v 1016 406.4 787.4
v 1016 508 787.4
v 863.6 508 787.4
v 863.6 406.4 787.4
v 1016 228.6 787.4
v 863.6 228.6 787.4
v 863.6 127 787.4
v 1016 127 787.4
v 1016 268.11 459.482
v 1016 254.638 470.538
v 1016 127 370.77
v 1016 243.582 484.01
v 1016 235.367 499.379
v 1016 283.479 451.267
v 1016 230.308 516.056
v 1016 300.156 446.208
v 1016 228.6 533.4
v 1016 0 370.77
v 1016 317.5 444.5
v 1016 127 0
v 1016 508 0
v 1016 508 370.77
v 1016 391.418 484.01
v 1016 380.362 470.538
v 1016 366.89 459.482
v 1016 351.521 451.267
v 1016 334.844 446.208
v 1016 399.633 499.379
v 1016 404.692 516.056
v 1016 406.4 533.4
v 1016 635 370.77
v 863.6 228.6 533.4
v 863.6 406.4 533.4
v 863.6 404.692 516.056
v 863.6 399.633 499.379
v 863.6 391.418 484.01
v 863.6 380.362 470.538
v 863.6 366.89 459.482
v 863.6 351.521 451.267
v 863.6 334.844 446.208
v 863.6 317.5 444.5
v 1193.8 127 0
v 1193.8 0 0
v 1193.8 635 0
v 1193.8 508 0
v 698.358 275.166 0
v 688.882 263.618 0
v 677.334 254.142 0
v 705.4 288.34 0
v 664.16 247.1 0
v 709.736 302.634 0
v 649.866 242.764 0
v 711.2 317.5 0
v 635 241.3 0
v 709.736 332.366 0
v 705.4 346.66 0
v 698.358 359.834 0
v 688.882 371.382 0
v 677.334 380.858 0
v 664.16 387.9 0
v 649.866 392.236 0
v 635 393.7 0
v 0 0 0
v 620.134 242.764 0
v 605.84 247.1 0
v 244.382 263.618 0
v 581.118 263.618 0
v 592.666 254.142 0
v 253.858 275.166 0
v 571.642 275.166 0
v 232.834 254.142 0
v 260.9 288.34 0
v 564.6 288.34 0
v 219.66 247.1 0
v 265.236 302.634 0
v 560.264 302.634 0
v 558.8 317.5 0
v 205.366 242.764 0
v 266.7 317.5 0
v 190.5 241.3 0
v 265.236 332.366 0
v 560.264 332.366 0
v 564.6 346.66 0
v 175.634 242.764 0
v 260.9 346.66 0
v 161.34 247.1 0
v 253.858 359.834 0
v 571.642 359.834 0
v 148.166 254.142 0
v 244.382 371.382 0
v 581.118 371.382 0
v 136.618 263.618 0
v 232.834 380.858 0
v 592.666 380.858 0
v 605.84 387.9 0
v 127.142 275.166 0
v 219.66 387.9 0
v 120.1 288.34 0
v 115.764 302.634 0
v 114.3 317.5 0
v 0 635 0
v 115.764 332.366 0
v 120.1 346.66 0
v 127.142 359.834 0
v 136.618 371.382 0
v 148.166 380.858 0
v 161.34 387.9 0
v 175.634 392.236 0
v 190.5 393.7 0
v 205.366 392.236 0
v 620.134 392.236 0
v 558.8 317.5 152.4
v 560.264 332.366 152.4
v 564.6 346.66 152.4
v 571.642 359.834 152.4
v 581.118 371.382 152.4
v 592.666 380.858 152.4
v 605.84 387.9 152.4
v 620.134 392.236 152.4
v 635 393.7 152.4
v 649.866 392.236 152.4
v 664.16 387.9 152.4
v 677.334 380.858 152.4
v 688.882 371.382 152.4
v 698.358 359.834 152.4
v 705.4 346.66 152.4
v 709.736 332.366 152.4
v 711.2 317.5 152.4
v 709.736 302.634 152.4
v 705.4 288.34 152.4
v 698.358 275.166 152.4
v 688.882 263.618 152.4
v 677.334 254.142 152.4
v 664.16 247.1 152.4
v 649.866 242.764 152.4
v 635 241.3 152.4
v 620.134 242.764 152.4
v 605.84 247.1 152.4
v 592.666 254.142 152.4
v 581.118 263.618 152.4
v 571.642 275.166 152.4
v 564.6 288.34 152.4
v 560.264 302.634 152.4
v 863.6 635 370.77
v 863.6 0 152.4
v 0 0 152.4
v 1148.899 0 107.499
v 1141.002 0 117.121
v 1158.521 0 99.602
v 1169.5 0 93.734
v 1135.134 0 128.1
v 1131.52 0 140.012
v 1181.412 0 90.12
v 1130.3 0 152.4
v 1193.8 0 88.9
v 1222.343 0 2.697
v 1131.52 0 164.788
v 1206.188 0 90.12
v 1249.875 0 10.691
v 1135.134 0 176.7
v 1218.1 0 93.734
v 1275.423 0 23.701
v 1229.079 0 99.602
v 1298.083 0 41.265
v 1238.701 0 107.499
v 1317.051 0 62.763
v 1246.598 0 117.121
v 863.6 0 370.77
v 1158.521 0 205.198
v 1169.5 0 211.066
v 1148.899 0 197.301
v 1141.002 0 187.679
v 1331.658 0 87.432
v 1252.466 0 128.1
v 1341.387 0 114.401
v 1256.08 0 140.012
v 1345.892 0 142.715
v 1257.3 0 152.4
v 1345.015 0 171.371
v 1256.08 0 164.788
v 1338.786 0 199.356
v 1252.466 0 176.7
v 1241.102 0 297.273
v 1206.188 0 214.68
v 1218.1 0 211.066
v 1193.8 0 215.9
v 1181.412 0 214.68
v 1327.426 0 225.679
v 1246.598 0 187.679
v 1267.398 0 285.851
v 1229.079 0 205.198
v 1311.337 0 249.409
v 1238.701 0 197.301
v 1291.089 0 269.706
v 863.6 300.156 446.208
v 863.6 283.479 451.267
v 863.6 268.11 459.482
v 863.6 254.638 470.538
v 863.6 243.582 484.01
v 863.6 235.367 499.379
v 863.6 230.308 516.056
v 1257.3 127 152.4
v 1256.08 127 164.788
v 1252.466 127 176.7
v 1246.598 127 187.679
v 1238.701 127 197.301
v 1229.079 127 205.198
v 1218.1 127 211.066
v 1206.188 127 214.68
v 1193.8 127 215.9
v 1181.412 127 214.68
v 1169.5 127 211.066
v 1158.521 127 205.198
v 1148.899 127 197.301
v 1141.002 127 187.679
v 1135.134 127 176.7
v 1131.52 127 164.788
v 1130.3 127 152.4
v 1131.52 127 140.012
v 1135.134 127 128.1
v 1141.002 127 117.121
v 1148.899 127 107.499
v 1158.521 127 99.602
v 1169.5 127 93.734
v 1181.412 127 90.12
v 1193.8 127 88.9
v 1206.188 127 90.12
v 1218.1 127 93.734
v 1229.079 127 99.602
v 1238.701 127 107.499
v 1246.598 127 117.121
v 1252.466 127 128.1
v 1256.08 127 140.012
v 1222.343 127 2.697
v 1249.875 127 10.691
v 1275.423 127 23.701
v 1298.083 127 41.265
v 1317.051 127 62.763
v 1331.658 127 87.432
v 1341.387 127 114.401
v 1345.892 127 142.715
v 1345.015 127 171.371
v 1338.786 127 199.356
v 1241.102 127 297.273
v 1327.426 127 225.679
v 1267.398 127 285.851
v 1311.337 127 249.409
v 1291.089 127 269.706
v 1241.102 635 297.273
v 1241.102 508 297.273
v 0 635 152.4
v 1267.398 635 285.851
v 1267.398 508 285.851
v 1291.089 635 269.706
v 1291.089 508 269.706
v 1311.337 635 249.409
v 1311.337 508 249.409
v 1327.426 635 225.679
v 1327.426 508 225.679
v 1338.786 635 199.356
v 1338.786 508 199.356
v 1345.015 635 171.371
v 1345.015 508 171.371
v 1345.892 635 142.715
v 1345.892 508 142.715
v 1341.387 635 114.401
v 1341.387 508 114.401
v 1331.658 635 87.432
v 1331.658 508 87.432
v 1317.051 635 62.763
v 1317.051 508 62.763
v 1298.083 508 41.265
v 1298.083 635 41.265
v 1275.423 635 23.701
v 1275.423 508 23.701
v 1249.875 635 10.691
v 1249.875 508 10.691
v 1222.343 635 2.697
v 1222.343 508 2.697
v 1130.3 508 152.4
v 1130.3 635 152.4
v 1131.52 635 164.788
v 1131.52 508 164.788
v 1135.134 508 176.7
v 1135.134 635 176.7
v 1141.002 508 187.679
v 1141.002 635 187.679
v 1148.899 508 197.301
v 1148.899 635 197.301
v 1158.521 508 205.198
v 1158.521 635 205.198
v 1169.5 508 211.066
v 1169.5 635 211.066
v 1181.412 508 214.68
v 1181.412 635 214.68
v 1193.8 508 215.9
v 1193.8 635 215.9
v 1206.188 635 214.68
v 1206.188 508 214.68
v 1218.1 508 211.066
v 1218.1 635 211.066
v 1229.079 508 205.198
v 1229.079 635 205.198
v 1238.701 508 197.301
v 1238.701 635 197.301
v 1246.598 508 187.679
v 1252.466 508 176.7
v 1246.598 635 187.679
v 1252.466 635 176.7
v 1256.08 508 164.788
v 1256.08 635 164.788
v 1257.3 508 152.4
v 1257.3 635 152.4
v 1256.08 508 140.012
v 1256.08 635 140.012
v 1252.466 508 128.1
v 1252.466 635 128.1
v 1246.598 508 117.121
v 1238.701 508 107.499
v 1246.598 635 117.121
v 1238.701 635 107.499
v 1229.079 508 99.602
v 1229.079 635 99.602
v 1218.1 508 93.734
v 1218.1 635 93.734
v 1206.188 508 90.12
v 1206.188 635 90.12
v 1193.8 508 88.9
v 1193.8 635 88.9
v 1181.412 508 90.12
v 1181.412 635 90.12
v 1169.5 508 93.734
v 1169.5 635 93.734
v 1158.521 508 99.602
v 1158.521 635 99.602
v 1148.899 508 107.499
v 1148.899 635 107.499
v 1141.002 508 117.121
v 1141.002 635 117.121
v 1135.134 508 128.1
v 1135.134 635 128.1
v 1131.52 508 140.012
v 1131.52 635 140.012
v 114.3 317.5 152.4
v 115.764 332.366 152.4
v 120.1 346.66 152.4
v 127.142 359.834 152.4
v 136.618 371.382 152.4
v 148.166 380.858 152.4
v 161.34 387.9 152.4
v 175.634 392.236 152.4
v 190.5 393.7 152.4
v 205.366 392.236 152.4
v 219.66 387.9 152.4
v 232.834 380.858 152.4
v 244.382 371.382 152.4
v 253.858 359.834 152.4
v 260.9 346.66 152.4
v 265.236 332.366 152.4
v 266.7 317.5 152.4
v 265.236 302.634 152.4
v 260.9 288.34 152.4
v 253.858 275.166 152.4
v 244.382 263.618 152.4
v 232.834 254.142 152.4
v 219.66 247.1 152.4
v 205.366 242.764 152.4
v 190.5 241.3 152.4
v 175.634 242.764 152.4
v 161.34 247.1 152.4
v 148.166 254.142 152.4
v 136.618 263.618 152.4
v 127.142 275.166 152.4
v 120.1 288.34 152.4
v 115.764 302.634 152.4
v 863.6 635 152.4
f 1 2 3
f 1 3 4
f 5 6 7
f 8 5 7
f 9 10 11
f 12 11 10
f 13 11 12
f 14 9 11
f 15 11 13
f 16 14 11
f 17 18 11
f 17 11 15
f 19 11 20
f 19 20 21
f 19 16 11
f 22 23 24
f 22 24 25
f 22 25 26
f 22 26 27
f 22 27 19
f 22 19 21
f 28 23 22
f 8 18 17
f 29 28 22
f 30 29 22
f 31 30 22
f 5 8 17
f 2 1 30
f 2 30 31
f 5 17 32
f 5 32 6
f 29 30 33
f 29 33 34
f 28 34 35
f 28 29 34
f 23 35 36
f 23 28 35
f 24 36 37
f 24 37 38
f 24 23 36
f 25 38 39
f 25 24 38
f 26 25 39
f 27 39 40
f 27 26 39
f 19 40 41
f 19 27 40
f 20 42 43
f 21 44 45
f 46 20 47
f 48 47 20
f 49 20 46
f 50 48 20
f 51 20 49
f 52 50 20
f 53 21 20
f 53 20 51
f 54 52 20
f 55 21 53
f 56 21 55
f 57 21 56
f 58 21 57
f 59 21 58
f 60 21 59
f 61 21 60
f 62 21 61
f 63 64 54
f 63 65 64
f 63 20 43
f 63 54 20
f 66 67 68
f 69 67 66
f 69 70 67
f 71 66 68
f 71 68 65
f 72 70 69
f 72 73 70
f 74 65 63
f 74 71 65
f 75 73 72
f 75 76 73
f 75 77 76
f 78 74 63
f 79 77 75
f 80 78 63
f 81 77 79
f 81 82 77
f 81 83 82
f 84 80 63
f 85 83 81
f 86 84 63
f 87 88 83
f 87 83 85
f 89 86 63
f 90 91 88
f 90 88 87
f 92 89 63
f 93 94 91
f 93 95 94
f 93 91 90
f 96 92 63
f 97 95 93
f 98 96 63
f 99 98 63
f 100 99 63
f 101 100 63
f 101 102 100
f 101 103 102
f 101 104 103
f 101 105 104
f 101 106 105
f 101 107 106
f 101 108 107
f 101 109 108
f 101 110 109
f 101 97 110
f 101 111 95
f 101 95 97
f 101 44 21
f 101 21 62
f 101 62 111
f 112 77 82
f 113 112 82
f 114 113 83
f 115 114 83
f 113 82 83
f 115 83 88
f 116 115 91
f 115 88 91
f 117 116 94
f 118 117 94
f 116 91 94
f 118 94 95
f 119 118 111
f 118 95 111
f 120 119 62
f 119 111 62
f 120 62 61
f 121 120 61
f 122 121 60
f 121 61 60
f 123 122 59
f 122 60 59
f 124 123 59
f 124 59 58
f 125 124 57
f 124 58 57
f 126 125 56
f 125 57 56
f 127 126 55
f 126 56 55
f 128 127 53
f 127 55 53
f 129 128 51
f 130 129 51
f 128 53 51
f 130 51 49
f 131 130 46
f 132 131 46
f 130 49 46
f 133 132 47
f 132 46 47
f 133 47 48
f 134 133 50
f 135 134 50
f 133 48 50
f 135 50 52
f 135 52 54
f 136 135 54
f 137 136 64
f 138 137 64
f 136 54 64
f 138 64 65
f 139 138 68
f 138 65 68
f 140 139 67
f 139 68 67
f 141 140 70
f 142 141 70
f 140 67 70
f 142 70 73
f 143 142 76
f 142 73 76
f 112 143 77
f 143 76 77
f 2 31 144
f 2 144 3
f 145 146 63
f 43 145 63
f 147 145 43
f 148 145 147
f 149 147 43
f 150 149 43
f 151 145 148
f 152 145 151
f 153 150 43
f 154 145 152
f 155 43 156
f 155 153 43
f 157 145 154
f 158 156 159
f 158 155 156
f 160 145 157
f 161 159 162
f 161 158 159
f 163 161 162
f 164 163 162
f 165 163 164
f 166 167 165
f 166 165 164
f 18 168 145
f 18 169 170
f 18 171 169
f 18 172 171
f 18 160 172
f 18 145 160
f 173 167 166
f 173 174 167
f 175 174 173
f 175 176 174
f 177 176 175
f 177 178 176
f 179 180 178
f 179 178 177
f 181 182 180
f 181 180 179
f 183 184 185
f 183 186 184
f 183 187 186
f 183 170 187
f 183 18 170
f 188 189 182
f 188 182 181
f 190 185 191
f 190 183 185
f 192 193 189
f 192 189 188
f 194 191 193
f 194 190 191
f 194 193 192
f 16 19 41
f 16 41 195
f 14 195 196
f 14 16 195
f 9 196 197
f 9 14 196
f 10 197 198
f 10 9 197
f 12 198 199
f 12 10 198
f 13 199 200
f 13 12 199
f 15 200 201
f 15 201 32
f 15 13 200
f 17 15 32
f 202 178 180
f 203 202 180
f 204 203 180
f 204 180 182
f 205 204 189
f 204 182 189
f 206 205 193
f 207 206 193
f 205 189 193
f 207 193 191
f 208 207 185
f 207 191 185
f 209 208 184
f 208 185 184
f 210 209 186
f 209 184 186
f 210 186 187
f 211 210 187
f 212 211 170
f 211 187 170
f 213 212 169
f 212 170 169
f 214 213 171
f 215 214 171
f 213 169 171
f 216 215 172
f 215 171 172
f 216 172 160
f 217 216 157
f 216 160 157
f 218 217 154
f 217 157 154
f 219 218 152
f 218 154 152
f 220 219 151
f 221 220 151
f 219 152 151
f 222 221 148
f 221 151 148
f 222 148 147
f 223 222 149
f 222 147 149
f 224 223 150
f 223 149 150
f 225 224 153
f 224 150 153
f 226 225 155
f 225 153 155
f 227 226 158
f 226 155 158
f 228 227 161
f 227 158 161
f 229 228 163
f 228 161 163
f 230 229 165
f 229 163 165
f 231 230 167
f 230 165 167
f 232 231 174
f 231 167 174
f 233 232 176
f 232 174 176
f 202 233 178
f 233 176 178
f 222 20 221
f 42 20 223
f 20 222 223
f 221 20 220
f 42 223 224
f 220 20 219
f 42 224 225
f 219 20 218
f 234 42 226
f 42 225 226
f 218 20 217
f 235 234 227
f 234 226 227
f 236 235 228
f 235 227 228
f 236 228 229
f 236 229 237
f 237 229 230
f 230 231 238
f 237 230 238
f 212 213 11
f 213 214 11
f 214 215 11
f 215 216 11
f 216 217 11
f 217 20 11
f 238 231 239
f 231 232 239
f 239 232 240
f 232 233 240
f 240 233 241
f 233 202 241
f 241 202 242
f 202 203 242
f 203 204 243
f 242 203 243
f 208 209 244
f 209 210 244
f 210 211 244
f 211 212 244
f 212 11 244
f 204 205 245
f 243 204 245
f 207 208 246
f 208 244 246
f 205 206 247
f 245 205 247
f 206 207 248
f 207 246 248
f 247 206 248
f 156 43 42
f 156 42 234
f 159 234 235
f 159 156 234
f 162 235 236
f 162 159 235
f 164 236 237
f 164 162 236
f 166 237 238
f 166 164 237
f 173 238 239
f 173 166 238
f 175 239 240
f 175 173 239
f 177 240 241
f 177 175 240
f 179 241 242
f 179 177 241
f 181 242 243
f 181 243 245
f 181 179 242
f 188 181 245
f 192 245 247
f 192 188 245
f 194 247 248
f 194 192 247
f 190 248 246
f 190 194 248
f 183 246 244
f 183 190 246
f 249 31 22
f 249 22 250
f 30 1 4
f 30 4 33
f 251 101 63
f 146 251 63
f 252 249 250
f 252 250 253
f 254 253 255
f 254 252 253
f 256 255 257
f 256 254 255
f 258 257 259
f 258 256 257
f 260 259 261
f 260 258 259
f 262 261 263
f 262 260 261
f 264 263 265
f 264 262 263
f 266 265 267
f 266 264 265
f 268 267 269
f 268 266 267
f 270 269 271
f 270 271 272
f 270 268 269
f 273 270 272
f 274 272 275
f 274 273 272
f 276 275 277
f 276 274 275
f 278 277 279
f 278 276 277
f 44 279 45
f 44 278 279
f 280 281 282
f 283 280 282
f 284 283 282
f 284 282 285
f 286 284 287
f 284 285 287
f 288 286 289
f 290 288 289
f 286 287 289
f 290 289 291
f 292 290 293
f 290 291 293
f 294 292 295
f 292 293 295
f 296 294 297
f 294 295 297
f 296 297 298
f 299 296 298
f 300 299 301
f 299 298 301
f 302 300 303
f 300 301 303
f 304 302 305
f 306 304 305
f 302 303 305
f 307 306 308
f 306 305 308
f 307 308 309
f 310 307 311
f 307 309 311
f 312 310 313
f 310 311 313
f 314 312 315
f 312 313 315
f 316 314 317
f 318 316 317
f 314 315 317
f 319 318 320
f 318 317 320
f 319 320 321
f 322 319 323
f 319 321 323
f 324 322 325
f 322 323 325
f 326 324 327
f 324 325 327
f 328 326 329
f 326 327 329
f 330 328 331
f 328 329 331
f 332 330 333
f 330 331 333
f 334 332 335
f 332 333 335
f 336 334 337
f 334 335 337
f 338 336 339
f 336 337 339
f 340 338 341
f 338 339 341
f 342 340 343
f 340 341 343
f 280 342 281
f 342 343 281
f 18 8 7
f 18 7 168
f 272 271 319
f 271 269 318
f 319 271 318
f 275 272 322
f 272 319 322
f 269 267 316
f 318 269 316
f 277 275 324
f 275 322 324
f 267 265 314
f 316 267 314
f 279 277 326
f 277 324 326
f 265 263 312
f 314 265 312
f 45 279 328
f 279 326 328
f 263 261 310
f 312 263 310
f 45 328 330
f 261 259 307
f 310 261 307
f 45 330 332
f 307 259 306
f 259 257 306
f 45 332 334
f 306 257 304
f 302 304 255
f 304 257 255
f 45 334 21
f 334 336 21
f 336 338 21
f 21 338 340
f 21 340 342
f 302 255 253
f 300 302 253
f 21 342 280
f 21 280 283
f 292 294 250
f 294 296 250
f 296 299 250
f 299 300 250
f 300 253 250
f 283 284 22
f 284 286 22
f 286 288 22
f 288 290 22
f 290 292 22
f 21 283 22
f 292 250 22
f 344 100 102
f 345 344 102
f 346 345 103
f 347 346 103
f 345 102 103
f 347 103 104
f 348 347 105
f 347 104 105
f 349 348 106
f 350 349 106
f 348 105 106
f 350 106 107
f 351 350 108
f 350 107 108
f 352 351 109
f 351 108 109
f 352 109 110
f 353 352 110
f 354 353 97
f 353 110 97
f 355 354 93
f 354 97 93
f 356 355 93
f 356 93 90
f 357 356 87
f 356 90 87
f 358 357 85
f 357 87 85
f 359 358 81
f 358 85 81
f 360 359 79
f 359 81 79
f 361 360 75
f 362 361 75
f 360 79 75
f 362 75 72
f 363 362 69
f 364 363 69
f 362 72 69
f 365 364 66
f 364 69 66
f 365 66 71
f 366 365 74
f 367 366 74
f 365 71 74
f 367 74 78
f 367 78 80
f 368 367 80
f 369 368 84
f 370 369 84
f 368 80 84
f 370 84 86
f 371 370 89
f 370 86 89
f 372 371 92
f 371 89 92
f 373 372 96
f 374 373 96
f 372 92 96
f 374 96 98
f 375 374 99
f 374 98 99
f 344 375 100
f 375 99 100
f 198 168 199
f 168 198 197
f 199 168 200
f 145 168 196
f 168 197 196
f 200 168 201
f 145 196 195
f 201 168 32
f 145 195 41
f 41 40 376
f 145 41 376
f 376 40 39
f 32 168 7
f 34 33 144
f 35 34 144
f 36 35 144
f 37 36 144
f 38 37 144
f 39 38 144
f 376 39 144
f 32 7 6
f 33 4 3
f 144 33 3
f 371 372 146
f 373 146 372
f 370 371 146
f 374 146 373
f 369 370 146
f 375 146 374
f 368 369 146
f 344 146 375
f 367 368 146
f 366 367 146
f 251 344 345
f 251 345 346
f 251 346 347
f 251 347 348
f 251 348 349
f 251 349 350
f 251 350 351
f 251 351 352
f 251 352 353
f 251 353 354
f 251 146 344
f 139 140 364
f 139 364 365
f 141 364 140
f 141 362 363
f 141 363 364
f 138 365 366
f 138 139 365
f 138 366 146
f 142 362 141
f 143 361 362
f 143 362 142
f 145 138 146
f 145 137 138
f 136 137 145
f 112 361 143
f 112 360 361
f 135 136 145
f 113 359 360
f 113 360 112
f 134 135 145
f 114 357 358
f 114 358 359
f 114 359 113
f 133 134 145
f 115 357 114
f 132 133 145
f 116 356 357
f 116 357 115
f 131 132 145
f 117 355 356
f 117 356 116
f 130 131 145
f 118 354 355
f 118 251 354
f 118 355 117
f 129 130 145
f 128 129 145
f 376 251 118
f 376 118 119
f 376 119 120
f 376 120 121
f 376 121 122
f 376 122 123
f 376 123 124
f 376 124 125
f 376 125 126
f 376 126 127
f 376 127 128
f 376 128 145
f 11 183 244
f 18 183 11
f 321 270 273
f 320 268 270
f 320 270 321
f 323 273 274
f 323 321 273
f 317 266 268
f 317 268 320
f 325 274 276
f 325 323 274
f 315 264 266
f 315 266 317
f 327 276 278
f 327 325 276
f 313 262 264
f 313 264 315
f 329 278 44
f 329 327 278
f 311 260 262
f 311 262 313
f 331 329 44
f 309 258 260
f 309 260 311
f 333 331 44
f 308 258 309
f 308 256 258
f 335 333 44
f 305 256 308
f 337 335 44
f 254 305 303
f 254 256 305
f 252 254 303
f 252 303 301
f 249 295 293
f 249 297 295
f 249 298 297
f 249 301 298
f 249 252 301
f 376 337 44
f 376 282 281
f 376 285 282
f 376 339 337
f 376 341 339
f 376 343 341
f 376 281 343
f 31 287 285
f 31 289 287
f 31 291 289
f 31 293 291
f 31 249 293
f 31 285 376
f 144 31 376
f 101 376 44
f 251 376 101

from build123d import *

# Parameters (mm, degrees)
F1_DEPTH = 152.4
F2_W     = 317.5
F2_H     = 218.3699290887
F3_DEPTH = 152.4
F4_R     = 63.5
F5_DEPTH = 127
F6_R     = 63.5
F7_DEPTH = 127


with BuildPart() as f1:
    # F0 (on Top) → F1 (new body)
    with BuildSketch(Plane.XY):
        Polygon((0, 317.5), (0, 0), (1016, 0), (1016, 635), (0, 635), align=None)
        with BuildLine():
            ThreePointArc((266.7, 317.5), (190.5, 241.3), (114.3, 317.5))
            ThreePointArc((114.3, 317.5), (190.5, 393.7), (266.7, 317.5))
        make_face(mode=Mode.SUBTRACT)
        with BuildLine():
            ThreePointArc((711.2, 317.5), (635, 241.3), (558.8, 317.5))
            ThreePointArc((558.8, 317.5), (635, 393.7), (711.2, 317.5))
        make_face(mode=Mode.SUBTRACT)
    extrude(amount=F1_DEPTH)

    # F2 (on face) → F3 (join)
    with BuildSketch(Plane.YZ.offset(1016)):
        with BuildLine():
            Line((317.5, 370.7699290887), (635, 370.7699290887))
            Line((635, 370.7699290887), (508, 787.4))
            Line((508, 787.4), (406.4, 787.4))
            Line((406.4, 787.4), (406.4, 533.4))
            ThreePointArc((406.4, 533.4), (380.3617928475, 470.5382071525), (317.5, 444.5))
            Line((317.5, 444.5), (317.5, 370.7699290887))
        make_face()
        with Locations((476.25, 261.5849645443)):
            Rectangle(F2_W, F2_H)
        with Locations((158.75, 261.5849645443)):
            Rectangle(F2_W, F2_H)
        with BuildLine():
            Line((127, 787.4), (0, 370.7699290887))
            Line((0, 370.7699290887), (317.5, 370.7699290887))
            Line((317.5, 370.7699290887), (317.5, 444.5))
            ThreePointArc((317.5, 444.5), (254.6382071525, 470.5382071525), (228.6, 533.4))
            Line((228.6, 533.4), (228.6, 787.4))
            Line((228.6, 787.4), (127, 787.4))
        make_face()
    extrude(amount=-F3_DEPTH)

    # F4 (on face) → F5 (join)
    with BuildSketch(Plane.XZ):
        with BuildLine():
            Line((1016, 370.7699290887), (1016, 0))
            Line((1016, 0), (1193.8, 0))
            ThreePointArc((1193.8, 0), (1344.3065953325, 128.4516229901), (1241.1016888122, 297.273428328))
            Line((1241.1016888122, 297.273428328), (1016, 370.7699290887))
        make_face()
        with Locations((1193.8, 152.4)):
            Circle(F4_R, mode=Mode.SUBTRACT)
    extrude(amount=-F5_DEPTH)

    # F6 (on face) → F7 (join)
    with BuildSketch(Plane(origin=(0, 635, 0), x_dir=(-1, 0, 0), z_dir=(0, 1, 0))):
        with BuildLine():
            Line((-1016, 0), (-1016, 370.7699290887))
            Line((-1016, 370.7699290887), (-1241.1016888122, 297.273428328))
            ThreePointArc((-1241.1016888122, 297.273428328), (-1344.3065953325, 128.4516229901), (-1193.8, 0))
            Line((-1193.8, 0), (-1016, 0))
        make_face()
        with Locations((-1193.8, 152.4)):
            Circle(F6_R, mode=Mode.SUBTRACT)
    extrude(amount=-F7_DEPTH)


solid = f1.part
